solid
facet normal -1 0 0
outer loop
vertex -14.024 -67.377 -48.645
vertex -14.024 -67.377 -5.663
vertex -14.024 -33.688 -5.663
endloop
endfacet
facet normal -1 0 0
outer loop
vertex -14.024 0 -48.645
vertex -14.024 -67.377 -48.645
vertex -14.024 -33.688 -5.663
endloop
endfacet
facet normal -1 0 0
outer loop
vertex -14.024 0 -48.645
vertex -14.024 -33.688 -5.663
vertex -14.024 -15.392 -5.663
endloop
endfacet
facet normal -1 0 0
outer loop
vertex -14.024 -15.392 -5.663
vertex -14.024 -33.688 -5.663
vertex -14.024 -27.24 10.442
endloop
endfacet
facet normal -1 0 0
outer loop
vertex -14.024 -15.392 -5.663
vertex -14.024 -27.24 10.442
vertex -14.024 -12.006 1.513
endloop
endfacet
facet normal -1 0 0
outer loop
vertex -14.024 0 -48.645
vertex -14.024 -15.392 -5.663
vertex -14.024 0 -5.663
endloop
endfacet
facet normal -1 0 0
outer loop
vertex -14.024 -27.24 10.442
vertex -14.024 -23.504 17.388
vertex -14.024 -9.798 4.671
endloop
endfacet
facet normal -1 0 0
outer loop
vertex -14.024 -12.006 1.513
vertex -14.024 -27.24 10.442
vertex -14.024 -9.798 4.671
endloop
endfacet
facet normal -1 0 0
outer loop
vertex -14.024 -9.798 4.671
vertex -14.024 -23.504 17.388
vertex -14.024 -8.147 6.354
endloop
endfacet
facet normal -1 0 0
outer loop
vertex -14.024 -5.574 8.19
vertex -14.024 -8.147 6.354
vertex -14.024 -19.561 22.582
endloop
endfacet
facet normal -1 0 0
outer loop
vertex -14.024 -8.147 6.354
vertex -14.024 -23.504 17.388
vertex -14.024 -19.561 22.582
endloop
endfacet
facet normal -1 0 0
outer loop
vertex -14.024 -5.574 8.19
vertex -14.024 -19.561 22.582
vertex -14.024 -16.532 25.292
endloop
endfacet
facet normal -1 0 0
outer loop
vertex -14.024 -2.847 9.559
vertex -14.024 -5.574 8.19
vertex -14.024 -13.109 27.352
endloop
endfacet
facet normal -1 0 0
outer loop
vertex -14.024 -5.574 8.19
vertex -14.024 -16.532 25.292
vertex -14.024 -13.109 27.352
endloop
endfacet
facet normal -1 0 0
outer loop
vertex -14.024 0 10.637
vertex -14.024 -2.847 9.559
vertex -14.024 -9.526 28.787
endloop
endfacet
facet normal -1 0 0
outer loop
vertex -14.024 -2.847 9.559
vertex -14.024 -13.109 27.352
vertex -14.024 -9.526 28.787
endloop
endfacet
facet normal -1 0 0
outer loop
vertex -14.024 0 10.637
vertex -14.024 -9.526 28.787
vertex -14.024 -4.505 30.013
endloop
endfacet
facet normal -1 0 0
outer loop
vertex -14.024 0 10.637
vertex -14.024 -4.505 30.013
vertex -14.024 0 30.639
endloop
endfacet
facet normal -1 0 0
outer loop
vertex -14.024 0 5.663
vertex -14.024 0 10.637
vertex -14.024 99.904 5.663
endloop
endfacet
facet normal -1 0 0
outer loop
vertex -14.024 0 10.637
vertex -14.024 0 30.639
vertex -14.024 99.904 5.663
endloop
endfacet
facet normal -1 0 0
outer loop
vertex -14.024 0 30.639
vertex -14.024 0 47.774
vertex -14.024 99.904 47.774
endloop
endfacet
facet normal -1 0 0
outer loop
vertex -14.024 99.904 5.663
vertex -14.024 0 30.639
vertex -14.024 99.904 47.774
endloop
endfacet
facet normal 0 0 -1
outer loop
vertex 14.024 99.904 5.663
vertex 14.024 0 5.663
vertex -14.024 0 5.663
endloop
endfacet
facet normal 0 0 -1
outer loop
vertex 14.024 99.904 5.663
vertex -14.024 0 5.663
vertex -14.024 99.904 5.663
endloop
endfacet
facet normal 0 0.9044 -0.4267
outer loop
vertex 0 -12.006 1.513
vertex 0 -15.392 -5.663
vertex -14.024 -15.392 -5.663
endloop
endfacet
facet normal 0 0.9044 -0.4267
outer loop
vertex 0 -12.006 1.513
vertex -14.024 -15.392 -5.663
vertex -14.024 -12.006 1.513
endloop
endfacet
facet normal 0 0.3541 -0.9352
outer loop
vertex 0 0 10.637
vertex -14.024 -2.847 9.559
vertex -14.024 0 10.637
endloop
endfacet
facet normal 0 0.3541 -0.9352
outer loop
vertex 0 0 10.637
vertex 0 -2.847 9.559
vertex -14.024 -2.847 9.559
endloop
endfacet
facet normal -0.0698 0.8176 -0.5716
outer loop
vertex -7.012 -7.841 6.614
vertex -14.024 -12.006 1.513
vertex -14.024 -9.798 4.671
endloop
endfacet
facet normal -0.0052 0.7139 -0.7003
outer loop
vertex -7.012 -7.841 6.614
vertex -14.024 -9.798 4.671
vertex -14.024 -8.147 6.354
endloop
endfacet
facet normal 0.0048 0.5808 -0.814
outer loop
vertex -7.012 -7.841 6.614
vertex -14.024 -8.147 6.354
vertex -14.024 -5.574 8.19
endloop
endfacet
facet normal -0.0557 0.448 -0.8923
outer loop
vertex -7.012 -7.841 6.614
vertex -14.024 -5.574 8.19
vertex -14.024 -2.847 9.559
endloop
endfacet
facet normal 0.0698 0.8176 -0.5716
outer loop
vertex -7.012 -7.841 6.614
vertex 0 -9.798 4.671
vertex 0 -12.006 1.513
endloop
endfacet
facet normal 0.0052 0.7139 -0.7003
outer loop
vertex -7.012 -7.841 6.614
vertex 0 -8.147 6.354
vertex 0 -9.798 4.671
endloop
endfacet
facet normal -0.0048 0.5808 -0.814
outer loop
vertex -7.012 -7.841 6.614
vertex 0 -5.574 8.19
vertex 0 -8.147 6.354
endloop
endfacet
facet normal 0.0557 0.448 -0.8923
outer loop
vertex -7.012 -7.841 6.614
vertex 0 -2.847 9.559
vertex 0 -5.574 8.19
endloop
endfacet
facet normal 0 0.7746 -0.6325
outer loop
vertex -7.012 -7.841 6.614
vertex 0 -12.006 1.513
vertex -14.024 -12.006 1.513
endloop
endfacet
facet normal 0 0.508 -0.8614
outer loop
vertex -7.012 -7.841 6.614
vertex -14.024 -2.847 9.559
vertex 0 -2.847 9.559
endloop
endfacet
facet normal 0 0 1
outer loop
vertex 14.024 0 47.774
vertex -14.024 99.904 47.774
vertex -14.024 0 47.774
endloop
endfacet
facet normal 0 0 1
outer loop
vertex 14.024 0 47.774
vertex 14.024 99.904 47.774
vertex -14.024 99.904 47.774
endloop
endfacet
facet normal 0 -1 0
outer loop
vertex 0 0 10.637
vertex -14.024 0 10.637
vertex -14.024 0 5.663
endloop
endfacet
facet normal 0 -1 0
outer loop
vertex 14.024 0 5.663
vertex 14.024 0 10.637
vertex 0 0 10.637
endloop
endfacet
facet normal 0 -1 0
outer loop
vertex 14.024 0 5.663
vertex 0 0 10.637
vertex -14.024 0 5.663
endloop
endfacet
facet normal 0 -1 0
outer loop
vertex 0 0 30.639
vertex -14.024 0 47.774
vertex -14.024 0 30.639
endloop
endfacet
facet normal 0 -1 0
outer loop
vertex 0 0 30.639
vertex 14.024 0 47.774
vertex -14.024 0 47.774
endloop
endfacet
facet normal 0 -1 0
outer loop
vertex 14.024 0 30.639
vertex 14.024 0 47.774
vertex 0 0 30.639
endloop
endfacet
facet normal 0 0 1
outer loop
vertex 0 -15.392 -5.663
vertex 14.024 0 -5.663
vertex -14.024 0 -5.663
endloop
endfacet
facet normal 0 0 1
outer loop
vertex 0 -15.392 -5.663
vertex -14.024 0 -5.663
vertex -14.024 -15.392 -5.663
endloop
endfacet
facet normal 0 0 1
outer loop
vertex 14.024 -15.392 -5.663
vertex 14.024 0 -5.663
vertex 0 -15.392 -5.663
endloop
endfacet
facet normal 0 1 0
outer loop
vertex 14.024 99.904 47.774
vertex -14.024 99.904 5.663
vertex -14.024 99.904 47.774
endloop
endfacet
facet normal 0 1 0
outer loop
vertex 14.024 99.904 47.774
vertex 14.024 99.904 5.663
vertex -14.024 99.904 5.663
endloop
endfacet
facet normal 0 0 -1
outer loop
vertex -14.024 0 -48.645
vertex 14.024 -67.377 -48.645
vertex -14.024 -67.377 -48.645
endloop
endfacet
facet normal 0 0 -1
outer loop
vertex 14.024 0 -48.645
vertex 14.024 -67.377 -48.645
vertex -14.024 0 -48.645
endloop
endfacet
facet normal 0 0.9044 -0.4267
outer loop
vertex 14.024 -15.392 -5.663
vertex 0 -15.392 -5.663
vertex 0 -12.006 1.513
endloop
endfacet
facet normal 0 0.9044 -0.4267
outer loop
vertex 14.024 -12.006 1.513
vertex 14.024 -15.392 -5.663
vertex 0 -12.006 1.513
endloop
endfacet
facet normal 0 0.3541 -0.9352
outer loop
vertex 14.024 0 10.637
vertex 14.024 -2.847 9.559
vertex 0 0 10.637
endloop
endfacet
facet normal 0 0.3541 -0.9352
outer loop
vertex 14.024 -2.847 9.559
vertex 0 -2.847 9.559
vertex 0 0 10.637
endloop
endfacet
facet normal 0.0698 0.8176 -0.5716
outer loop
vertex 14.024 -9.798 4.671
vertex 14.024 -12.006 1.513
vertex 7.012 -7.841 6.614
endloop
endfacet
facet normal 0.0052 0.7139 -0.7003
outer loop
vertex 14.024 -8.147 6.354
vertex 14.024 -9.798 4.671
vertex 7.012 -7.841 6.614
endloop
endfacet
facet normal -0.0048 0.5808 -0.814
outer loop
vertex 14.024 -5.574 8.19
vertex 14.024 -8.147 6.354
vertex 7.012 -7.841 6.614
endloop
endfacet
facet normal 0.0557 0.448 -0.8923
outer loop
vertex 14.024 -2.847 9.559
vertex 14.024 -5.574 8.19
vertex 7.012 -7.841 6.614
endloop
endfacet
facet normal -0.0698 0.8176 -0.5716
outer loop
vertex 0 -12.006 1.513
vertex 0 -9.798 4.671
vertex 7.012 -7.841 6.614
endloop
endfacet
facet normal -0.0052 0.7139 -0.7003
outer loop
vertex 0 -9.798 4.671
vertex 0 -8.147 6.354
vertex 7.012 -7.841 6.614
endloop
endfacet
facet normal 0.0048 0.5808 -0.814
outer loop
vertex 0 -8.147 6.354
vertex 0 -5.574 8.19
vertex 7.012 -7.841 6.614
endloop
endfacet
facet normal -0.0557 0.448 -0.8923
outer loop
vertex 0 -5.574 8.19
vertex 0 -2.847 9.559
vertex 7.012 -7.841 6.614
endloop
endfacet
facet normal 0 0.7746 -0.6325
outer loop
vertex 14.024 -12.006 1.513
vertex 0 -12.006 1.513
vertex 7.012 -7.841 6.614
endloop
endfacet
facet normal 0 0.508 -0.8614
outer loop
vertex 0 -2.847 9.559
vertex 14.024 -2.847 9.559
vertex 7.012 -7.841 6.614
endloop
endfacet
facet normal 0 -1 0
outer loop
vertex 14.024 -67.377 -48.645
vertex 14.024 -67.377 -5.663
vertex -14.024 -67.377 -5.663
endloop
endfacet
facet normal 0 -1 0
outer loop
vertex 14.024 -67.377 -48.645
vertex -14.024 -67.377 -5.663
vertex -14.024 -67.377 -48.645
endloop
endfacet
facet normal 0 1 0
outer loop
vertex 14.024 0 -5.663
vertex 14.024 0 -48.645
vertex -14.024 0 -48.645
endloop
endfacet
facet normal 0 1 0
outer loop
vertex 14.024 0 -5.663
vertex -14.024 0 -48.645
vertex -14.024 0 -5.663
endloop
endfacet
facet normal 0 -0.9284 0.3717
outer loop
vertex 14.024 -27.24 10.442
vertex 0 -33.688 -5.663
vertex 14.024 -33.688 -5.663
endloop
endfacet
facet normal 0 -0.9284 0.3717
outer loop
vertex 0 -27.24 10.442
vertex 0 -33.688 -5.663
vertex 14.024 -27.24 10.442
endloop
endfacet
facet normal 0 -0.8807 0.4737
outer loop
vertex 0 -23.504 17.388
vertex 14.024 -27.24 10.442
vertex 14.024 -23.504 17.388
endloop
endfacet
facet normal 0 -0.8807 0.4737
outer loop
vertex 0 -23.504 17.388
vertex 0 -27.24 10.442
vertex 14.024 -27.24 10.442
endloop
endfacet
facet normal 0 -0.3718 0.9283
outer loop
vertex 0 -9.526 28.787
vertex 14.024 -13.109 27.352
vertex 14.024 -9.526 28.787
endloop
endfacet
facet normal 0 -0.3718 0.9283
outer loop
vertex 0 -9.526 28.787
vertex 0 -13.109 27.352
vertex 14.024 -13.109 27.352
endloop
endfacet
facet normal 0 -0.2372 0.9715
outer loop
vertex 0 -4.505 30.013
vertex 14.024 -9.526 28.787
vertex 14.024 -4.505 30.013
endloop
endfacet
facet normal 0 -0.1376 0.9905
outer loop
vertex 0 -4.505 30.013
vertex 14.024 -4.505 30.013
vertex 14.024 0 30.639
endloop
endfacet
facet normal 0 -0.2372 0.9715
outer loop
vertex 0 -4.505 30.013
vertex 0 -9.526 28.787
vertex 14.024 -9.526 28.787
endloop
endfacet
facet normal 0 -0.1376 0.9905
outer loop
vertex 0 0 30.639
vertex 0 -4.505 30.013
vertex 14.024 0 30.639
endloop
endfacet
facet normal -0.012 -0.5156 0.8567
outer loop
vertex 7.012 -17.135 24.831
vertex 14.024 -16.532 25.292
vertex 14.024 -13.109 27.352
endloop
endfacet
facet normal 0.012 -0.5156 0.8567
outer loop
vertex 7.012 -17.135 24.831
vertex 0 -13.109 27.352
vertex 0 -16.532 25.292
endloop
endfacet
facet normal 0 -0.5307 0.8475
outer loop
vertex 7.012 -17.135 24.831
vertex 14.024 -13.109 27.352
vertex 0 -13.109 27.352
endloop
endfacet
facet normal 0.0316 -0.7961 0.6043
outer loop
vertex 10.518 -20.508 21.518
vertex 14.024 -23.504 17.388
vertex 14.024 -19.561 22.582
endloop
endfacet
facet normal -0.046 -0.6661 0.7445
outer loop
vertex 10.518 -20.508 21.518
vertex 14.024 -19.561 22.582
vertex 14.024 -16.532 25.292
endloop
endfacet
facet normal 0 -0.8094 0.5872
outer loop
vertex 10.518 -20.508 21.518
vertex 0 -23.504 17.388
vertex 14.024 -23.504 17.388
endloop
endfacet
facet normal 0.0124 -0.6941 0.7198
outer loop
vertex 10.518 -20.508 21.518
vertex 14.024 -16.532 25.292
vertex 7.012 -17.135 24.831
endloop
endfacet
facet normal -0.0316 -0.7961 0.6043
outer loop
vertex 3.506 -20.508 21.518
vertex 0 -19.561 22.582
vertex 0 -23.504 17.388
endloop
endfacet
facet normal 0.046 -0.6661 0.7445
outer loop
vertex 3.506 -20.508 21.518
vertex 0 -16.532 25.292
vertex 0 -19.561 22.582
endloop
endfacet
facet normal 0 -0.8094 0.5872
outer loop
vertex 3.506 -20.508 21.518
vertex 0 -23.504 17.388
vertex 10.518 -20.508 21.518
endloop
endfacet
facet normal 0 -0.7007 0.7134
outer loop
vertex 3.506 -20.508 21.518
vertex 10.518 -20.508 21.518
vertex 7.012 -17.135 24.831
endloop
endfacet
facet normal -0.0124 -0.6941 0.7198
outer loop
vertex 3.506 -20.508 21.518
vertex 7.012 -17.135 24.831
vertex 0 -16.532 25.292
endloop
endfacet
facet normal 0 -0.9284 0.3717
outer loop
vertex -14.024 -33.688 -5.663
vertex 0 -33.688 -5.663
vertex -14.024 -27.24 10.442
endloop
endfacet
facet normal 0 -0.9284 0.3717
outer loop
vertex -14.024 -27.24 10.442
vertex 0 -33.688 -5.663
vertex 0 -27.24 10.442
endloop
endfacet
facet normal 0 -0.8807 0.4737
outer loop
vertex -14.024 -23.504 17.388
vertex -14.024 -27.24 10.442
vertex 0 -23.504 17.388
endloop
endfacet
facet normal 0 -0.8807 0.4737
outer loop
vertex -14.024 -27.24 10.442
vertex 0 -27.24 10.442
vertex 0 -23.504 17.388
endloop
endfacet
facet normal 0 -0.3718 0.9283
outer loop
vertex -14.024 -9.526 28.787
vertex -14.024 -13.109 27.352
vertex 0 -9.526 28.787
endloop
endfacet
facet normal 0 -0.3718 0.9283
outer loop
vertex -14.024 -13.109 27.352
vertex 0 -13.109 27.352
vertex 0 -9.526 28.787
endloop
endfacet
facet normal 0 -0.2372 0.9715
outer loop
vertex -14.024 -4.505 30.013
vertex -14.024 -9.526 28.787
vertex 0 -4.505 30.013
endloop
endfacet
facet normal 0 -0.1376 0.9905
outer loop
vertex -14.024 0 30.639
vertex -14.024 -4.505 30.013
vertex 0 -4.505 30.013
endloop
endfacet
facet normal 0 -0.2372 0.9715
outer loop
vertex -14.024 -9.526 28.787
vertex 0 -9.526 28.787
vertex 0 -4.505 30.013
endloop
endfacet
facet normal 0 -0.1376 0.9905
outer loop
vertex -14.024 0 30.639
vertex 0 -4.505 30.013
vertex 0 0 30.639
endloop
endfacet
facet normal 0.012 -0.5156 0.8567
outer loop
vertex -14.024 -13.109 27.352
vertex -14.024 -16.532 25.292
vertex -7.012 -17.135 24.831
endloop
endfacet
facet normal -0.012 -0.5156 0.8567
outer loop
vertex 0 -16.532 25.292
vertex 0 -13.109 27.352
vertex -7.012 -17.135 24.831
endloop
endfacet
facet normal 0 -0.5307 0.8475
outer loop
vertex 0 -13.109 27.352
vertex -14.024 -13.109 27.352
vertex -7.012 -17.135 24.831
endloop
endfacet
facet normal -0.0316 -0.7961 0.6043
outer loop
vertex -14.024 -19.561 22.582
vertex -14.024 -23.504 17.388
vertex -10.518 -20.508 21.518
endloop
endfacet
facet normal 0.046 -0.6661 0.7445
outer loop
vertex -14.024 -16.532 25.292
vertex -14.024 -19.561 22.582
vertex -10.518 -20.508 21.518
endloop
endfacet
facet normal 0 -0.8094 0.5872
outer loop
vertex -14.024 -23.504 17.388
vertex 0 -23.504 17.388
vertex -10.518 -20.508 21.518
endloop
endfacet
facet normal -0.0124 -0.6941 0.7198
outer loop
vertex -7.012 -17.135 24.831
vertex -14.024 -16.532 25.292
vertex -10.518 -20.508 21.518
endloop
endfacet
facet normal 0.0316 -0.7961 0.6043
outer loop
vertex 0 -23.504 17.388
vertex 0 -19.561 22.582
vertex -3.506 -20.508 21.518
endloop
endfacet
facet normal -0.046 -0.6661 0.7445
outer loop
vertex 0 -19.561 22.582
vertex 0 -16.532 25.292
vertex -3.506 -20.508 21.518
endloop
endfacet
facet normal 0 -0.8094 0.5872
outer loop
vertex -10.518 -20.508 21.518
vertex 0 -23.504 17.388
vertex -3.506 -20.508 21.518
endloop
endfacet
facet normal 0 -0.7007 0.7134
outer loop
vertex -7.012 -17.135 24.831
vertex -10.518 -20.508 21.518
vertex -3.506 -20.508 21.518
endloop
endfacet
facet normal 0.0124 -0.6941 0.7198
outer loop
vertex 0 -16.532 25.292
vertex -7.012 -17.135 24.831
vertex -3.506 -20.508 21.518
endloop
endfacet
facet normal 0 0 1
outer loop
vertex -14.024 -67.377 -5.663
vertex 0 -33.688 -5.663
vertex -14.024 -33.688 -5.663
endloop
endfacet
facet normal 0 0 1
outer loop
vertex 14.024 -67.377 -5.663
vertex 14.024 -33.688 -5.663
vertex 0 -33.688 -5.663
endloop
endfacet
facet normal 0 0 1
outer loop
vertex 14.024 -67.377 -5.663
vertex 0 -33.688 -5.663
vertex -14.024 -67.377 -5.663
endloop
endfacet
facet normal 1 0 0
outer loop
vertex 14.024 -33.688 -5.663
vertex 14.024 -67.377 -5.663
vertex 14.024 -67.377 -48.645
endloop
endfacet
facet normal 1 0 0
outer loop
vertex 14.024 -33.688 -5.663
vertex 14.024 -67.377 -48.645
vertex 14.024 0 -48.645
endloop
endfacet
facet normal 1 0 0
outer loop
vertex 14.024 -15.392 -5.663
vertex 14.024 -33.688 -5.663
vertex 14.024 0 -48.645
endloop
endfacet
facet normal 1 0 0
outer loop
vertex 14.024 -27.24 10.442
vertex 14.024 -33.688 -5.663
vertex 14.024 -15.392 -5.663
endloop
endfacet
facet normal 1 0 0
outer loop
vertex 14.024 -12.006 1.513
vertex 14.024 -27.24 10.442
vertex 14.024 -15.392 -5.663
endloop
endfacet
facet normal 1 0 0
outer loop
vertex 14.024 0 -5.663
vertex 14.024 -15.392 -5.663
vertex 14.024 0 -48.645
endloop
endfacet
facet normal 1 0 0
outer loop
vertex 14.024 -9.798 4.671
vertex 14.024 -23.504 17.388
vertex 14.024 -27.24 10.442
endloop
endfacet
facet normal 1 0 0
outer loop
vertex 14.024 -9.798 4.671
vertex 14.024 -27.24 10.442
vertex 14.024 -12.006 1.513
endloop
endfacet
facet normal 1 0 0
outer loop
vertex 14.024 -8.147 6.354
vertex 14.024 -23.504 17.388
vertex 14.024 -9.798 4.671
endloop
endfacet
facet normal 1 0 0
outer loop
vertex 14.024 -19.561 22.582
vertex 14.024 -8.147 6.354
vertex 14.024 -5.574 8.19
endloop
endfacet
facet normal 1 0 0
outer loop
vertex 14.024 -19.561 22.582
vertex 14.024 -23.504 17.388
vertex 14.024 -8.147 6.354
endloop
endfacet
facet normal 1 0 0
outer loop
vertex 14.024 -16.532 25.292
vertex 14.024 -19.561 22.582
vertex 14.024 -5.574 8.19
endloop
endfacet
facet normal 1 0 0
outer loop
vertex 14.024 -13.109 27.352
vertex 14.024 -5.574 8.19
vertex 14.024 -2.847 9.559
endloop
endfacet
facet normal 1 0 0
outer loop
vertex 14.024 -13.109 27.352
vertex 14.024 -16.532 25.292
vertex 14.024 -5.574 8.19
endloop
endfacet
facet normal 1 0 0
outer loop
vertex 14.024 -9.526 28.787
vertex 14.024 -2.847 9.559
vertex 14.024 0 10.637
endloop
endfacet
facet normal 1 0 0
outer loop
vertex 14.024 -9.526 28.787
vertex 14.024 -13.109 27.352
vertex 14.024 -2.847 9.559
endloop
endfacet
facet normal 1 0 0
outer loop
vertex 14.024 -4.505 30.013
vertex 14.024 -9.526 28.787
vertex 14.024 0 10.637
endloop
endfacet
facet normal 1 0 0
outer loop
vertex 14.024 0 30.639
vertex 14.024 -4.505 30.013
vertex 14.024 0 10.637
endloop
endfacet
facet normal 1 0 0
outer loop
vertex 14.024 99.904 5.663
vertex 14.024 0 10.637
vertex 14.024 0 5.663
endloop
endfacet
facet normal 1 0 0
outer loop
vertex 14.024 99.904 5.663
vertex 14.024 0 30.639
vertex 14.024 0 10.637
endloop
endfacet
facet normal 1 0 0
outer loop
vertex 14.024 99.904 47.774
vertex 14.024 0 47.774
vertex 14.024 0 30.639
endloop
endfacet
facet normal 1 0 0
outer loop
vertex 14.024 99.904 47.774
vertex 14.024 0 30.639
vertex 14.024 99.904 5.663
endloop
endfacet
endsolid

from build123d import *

# Parameters (mm, degrees)
F1_DEPTH = 14.02438


with BuildPart() as f1:
    # F0 (on Right) → F1 (new body, symmetric)
    with BuildSketch(Plane.YZ):
        Polygon((0, 47.7736666799), (0, 30.6390393525), (0, 10.6372975803), (0, 5.6631397456), (99.9035909772, 5.6631397456), (99.9035909772, 47.7736666799), align=None)
        with BuildLine():
            add(Edge.make_bspline(
                [(-33.6884222925, -5.6631397456), (-29.1470986378, 6.6140969626), (-21.326469053, 27.7567698753), (-4.8170343565, 30.103566169), (0, 30.6390393525)],
                knots=[0, 0, 0, 0, 0.4440648632, 0.7647256771, 0.7647256771, 0.7647256771, 0.7647256771], degree=3))
            Line((-33.6884222925, -5.6631397456), (-15.3921237215, -5.6631397456))
            add(Edge.make_bspline(
                [(-15.3921237215, -5.6631397456), (-13.4469685801, -1.0420002941), (-10.3240499344, 6.3771727322), (-2.7795746982, 9.7078291076), (0, 10.6372975803)],
                knots=[0, 0, 0, 0, 0.3701880082, 0.5943315309, 0.5943315309, 0.5943315309, 0.5943315309], degree=3))
            Line((0, 10.6372975803), (0, 30.6390393525))
        make_face()
        Polygon((-33.6884222925, -5.6631397456), (-67.3768445849, -5.6631397456), (-67.3768445849, -48.6449189484), (0, -48.6449189484), (0, -5.6631397456), (-15.3921237215, -5.6631397456), align=None)
    extrude(amount=F1_DEPTH, both=True)


solid = f1.part
